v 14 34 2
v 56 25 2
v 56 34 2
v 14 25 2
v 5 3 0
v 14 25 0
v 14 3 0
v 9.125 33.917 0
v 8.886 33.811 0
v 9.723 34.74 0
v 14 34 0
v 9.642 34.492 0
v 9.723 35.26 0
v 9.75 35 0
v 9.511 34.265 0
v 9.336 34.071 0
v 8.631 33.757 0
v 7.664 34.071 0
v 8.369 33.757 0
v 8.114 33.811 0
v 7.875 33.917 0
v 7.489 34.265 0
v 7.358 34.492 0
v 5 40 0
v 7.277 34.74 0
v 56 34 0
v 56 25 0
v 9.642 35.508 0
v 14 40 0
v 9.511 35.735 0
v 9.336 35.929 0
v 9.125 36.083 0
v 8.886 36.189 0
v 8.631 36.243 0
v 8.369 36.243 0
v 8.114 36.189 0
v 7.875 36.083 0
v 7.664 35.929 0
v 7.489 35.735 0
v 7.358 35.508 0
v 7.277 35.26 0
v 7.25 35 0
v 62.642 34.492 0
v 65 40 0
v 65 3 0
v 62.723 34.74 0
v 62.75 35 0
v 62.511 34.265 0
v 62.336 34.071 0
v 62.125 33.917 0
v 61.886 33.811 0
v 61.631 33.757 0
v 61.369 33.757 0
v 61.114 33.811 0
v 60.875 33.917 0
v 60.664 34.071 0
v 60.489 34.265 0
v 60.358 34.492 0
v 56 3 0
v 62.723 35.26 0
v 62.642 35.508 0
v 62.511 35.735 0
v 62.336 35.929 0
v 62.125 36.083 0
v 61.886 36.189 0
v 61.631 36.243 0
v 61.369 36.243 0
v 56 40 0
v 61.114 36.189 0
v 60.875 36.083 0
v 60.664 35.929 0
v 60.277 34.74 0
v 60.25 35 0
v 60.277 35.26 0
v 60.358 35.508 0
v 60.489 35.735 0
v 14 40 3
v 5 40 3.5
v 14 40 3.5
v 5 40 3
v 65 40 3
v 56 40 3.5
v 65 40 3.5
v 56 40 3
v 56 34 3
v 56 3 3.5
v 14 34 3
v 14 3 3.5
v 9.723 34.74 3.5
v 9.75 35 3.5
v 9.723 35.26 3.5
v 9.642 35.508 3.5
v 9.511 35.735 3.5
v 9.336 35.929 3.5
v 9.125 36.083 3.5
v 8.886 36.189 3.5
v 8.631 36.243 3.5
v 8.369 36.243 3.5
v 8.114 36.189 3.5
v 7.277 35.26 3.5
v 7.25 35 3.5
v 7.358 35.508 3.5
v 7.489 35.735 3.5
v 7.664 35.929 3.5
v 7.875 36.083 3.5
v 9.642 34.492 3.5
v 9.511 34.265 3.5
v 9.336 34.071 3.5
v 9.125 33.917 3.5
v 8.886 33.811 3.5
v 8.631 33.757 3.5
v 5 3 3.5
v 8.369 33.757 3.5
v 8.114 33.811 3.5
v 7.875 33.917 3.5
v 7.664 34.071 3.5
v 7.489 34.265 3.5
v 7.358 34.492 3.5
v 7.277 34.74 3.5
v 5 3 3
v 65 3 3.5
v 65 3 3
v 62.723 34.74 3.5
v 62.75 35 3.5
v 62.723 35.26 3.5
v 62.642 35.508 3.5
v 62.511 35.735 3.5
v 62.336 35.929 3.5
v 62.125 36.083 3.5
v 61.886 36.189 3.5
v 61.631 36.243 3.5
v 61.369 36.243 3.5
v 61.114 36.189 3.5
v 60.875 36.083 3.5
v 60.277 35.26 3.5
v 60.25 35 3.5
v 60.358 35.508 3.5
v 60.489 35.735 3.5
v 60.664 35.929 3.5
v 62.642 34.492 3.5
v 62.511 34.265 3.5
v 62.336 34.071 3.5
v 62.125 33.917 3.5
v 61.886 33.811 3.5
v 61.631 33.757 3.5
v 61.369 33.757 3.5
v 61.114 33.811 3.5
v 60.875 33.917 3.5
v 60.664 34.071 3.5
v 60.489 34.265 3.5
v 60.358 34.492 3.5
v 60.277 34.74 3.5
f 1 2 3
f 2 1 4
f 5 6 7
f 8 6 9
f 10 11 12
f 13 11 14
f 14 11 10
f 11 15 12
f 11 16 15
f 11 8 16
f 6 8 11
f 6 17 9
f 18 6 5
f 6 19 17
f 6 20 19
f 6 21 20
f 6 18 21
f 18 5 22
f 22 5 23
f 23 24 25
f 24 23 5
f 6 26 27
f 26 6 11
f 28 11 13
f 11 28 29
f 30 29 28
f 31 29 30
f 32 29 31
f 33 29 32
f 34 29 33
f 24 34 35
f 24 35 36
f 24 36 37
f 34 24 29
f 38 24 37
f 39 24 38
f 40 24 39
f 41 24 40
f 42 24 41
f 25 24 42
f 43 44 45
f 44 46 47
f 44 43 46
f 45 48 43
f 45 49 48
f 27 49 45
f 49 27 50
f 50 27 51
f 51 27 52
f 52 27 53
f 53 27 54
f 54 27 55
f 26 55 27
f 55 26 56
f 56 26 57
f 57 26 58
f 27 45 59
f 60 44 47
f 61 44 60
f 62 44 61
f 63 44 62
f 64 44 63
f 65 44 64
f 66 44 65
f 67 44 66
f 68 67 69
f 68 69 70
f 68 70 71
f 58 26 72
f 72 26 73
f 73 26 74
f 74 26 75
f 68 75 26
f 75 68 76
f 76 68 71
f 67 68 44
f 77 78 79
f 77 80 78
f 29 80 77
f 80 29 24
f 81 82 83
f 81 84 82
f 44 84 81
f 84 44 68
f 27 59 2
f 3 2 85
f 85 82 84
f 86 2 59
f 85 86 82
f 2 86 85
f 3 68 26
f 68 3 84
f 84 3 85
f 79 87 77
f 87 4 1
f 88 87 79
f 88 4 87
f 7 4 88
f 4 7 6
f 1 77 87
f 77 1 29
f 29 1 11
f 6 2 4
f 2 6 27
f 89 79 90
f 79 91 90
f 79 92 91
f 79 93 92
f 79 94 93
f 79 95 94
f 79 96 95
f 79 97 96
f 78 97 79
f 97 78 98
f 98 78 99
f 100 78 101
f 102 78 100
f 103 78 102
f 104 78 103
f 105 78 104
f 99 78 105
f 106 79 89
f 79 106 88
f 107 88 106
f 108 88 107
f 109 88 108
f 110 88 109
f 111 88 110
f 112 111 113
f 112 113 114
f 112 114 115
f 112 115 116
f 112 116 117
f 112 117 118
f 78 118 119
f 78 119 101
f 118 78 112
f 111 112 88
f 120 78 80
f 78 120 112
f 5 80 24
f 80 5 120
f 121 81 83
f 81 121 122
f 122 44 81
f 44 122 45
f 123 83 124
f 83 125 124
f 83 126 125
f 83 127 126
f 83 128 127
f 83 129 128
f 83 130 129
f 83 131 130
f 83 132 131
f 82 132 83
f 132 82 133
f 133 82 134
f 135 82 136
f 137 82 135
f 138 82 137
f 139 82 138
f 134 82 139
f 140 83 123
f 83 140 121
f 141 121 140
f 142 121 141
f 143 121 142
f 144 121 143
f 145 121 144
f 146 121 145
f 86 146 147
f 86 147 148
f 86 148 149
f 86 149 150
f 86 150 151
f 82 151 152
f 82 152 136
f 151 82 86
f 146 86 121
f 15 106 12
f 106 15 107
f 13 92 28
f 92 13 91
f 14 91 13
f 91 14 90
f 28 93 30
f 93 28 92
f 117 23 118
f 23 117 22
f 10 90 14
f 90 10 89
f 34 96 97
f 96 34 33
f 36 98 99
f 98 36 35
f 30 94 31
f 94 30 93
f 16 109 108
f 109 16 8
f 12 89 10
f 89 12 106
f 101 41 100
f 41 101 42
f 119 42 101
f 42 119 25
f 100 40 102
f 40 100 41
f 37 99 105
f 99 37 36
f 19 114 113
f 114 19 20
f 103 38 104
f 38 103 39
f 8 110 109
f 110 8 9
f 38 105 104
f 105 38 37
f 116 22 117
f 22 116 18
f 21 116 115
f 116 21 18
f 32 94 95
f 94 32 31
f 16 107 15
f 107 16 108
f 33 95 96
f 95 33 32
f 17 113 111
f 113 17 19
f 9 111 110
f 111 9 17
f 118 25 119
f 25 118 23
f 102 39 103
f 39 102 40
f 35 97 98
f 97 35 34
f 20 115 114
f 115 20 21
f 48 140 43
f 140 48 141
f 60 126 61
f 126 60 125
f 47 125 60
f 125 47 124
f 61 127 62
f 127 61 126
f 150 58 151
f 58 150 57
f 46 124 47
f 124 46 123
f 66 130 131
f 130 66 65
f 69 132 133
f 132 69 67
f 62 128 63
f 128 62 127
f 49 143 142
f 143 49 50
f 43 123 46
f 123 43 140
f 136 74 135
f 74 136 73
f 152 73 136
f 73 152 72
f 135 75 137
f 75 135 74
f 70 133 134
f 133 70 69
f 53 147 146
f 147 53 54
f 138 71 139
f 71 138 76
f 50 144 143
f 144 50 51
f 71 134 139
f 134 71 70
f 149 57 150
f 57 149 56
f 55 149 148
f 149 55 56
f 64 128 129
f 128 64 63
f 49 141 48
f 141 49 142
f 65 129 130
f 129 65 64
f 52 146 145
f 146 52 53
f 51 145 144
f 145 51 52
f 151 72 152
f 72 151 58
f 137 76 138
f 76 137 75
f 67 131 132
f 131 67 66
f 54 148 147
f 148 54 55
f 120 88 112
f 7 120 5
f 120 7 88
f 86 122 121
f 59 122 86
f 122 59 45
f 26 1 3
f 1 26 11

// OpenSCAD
$fn=30;

difference()
{
	union()
	{
		difference()
			{
			cube([70,40,2]);
			translate ([14,-1,-1]) cube([42,26,4]);
			}
		translate([5,0,0]) cube([9,40,3.5]);
		translate([56,0,0]) cube([9,40,3.5]);
		
//		translate([0,20,0]) cube([10,20,4]);
//		translate([60,20,0]) cube([10,20,4]);
	}
	translate([8.5,35,-1]) cylinder(d=2.5,h=6);
	translate([61.5,35,-1]) cylinder(d=2.5,h=6);
	translate([-1,-1,-1]) cube([72,4,6]);

//	translate([9,9,-1]) cylinder(d=1.5,h=6);
//	translate([9,19,-1]) cylinder(d=1.5,h=6);
//	translate([61,9,-1]) cylinder(d=1.5,h=6);
//	translate([61,19,-1]) cylinder(d=1.5,h=6);

	translate ([14,34,-1]) cube([42,26,4]);
	translate ([-1,-1,-1]) cube([6,50,4]);
	translate ([65,-1,-1]) cube([6,50,4]);
}
